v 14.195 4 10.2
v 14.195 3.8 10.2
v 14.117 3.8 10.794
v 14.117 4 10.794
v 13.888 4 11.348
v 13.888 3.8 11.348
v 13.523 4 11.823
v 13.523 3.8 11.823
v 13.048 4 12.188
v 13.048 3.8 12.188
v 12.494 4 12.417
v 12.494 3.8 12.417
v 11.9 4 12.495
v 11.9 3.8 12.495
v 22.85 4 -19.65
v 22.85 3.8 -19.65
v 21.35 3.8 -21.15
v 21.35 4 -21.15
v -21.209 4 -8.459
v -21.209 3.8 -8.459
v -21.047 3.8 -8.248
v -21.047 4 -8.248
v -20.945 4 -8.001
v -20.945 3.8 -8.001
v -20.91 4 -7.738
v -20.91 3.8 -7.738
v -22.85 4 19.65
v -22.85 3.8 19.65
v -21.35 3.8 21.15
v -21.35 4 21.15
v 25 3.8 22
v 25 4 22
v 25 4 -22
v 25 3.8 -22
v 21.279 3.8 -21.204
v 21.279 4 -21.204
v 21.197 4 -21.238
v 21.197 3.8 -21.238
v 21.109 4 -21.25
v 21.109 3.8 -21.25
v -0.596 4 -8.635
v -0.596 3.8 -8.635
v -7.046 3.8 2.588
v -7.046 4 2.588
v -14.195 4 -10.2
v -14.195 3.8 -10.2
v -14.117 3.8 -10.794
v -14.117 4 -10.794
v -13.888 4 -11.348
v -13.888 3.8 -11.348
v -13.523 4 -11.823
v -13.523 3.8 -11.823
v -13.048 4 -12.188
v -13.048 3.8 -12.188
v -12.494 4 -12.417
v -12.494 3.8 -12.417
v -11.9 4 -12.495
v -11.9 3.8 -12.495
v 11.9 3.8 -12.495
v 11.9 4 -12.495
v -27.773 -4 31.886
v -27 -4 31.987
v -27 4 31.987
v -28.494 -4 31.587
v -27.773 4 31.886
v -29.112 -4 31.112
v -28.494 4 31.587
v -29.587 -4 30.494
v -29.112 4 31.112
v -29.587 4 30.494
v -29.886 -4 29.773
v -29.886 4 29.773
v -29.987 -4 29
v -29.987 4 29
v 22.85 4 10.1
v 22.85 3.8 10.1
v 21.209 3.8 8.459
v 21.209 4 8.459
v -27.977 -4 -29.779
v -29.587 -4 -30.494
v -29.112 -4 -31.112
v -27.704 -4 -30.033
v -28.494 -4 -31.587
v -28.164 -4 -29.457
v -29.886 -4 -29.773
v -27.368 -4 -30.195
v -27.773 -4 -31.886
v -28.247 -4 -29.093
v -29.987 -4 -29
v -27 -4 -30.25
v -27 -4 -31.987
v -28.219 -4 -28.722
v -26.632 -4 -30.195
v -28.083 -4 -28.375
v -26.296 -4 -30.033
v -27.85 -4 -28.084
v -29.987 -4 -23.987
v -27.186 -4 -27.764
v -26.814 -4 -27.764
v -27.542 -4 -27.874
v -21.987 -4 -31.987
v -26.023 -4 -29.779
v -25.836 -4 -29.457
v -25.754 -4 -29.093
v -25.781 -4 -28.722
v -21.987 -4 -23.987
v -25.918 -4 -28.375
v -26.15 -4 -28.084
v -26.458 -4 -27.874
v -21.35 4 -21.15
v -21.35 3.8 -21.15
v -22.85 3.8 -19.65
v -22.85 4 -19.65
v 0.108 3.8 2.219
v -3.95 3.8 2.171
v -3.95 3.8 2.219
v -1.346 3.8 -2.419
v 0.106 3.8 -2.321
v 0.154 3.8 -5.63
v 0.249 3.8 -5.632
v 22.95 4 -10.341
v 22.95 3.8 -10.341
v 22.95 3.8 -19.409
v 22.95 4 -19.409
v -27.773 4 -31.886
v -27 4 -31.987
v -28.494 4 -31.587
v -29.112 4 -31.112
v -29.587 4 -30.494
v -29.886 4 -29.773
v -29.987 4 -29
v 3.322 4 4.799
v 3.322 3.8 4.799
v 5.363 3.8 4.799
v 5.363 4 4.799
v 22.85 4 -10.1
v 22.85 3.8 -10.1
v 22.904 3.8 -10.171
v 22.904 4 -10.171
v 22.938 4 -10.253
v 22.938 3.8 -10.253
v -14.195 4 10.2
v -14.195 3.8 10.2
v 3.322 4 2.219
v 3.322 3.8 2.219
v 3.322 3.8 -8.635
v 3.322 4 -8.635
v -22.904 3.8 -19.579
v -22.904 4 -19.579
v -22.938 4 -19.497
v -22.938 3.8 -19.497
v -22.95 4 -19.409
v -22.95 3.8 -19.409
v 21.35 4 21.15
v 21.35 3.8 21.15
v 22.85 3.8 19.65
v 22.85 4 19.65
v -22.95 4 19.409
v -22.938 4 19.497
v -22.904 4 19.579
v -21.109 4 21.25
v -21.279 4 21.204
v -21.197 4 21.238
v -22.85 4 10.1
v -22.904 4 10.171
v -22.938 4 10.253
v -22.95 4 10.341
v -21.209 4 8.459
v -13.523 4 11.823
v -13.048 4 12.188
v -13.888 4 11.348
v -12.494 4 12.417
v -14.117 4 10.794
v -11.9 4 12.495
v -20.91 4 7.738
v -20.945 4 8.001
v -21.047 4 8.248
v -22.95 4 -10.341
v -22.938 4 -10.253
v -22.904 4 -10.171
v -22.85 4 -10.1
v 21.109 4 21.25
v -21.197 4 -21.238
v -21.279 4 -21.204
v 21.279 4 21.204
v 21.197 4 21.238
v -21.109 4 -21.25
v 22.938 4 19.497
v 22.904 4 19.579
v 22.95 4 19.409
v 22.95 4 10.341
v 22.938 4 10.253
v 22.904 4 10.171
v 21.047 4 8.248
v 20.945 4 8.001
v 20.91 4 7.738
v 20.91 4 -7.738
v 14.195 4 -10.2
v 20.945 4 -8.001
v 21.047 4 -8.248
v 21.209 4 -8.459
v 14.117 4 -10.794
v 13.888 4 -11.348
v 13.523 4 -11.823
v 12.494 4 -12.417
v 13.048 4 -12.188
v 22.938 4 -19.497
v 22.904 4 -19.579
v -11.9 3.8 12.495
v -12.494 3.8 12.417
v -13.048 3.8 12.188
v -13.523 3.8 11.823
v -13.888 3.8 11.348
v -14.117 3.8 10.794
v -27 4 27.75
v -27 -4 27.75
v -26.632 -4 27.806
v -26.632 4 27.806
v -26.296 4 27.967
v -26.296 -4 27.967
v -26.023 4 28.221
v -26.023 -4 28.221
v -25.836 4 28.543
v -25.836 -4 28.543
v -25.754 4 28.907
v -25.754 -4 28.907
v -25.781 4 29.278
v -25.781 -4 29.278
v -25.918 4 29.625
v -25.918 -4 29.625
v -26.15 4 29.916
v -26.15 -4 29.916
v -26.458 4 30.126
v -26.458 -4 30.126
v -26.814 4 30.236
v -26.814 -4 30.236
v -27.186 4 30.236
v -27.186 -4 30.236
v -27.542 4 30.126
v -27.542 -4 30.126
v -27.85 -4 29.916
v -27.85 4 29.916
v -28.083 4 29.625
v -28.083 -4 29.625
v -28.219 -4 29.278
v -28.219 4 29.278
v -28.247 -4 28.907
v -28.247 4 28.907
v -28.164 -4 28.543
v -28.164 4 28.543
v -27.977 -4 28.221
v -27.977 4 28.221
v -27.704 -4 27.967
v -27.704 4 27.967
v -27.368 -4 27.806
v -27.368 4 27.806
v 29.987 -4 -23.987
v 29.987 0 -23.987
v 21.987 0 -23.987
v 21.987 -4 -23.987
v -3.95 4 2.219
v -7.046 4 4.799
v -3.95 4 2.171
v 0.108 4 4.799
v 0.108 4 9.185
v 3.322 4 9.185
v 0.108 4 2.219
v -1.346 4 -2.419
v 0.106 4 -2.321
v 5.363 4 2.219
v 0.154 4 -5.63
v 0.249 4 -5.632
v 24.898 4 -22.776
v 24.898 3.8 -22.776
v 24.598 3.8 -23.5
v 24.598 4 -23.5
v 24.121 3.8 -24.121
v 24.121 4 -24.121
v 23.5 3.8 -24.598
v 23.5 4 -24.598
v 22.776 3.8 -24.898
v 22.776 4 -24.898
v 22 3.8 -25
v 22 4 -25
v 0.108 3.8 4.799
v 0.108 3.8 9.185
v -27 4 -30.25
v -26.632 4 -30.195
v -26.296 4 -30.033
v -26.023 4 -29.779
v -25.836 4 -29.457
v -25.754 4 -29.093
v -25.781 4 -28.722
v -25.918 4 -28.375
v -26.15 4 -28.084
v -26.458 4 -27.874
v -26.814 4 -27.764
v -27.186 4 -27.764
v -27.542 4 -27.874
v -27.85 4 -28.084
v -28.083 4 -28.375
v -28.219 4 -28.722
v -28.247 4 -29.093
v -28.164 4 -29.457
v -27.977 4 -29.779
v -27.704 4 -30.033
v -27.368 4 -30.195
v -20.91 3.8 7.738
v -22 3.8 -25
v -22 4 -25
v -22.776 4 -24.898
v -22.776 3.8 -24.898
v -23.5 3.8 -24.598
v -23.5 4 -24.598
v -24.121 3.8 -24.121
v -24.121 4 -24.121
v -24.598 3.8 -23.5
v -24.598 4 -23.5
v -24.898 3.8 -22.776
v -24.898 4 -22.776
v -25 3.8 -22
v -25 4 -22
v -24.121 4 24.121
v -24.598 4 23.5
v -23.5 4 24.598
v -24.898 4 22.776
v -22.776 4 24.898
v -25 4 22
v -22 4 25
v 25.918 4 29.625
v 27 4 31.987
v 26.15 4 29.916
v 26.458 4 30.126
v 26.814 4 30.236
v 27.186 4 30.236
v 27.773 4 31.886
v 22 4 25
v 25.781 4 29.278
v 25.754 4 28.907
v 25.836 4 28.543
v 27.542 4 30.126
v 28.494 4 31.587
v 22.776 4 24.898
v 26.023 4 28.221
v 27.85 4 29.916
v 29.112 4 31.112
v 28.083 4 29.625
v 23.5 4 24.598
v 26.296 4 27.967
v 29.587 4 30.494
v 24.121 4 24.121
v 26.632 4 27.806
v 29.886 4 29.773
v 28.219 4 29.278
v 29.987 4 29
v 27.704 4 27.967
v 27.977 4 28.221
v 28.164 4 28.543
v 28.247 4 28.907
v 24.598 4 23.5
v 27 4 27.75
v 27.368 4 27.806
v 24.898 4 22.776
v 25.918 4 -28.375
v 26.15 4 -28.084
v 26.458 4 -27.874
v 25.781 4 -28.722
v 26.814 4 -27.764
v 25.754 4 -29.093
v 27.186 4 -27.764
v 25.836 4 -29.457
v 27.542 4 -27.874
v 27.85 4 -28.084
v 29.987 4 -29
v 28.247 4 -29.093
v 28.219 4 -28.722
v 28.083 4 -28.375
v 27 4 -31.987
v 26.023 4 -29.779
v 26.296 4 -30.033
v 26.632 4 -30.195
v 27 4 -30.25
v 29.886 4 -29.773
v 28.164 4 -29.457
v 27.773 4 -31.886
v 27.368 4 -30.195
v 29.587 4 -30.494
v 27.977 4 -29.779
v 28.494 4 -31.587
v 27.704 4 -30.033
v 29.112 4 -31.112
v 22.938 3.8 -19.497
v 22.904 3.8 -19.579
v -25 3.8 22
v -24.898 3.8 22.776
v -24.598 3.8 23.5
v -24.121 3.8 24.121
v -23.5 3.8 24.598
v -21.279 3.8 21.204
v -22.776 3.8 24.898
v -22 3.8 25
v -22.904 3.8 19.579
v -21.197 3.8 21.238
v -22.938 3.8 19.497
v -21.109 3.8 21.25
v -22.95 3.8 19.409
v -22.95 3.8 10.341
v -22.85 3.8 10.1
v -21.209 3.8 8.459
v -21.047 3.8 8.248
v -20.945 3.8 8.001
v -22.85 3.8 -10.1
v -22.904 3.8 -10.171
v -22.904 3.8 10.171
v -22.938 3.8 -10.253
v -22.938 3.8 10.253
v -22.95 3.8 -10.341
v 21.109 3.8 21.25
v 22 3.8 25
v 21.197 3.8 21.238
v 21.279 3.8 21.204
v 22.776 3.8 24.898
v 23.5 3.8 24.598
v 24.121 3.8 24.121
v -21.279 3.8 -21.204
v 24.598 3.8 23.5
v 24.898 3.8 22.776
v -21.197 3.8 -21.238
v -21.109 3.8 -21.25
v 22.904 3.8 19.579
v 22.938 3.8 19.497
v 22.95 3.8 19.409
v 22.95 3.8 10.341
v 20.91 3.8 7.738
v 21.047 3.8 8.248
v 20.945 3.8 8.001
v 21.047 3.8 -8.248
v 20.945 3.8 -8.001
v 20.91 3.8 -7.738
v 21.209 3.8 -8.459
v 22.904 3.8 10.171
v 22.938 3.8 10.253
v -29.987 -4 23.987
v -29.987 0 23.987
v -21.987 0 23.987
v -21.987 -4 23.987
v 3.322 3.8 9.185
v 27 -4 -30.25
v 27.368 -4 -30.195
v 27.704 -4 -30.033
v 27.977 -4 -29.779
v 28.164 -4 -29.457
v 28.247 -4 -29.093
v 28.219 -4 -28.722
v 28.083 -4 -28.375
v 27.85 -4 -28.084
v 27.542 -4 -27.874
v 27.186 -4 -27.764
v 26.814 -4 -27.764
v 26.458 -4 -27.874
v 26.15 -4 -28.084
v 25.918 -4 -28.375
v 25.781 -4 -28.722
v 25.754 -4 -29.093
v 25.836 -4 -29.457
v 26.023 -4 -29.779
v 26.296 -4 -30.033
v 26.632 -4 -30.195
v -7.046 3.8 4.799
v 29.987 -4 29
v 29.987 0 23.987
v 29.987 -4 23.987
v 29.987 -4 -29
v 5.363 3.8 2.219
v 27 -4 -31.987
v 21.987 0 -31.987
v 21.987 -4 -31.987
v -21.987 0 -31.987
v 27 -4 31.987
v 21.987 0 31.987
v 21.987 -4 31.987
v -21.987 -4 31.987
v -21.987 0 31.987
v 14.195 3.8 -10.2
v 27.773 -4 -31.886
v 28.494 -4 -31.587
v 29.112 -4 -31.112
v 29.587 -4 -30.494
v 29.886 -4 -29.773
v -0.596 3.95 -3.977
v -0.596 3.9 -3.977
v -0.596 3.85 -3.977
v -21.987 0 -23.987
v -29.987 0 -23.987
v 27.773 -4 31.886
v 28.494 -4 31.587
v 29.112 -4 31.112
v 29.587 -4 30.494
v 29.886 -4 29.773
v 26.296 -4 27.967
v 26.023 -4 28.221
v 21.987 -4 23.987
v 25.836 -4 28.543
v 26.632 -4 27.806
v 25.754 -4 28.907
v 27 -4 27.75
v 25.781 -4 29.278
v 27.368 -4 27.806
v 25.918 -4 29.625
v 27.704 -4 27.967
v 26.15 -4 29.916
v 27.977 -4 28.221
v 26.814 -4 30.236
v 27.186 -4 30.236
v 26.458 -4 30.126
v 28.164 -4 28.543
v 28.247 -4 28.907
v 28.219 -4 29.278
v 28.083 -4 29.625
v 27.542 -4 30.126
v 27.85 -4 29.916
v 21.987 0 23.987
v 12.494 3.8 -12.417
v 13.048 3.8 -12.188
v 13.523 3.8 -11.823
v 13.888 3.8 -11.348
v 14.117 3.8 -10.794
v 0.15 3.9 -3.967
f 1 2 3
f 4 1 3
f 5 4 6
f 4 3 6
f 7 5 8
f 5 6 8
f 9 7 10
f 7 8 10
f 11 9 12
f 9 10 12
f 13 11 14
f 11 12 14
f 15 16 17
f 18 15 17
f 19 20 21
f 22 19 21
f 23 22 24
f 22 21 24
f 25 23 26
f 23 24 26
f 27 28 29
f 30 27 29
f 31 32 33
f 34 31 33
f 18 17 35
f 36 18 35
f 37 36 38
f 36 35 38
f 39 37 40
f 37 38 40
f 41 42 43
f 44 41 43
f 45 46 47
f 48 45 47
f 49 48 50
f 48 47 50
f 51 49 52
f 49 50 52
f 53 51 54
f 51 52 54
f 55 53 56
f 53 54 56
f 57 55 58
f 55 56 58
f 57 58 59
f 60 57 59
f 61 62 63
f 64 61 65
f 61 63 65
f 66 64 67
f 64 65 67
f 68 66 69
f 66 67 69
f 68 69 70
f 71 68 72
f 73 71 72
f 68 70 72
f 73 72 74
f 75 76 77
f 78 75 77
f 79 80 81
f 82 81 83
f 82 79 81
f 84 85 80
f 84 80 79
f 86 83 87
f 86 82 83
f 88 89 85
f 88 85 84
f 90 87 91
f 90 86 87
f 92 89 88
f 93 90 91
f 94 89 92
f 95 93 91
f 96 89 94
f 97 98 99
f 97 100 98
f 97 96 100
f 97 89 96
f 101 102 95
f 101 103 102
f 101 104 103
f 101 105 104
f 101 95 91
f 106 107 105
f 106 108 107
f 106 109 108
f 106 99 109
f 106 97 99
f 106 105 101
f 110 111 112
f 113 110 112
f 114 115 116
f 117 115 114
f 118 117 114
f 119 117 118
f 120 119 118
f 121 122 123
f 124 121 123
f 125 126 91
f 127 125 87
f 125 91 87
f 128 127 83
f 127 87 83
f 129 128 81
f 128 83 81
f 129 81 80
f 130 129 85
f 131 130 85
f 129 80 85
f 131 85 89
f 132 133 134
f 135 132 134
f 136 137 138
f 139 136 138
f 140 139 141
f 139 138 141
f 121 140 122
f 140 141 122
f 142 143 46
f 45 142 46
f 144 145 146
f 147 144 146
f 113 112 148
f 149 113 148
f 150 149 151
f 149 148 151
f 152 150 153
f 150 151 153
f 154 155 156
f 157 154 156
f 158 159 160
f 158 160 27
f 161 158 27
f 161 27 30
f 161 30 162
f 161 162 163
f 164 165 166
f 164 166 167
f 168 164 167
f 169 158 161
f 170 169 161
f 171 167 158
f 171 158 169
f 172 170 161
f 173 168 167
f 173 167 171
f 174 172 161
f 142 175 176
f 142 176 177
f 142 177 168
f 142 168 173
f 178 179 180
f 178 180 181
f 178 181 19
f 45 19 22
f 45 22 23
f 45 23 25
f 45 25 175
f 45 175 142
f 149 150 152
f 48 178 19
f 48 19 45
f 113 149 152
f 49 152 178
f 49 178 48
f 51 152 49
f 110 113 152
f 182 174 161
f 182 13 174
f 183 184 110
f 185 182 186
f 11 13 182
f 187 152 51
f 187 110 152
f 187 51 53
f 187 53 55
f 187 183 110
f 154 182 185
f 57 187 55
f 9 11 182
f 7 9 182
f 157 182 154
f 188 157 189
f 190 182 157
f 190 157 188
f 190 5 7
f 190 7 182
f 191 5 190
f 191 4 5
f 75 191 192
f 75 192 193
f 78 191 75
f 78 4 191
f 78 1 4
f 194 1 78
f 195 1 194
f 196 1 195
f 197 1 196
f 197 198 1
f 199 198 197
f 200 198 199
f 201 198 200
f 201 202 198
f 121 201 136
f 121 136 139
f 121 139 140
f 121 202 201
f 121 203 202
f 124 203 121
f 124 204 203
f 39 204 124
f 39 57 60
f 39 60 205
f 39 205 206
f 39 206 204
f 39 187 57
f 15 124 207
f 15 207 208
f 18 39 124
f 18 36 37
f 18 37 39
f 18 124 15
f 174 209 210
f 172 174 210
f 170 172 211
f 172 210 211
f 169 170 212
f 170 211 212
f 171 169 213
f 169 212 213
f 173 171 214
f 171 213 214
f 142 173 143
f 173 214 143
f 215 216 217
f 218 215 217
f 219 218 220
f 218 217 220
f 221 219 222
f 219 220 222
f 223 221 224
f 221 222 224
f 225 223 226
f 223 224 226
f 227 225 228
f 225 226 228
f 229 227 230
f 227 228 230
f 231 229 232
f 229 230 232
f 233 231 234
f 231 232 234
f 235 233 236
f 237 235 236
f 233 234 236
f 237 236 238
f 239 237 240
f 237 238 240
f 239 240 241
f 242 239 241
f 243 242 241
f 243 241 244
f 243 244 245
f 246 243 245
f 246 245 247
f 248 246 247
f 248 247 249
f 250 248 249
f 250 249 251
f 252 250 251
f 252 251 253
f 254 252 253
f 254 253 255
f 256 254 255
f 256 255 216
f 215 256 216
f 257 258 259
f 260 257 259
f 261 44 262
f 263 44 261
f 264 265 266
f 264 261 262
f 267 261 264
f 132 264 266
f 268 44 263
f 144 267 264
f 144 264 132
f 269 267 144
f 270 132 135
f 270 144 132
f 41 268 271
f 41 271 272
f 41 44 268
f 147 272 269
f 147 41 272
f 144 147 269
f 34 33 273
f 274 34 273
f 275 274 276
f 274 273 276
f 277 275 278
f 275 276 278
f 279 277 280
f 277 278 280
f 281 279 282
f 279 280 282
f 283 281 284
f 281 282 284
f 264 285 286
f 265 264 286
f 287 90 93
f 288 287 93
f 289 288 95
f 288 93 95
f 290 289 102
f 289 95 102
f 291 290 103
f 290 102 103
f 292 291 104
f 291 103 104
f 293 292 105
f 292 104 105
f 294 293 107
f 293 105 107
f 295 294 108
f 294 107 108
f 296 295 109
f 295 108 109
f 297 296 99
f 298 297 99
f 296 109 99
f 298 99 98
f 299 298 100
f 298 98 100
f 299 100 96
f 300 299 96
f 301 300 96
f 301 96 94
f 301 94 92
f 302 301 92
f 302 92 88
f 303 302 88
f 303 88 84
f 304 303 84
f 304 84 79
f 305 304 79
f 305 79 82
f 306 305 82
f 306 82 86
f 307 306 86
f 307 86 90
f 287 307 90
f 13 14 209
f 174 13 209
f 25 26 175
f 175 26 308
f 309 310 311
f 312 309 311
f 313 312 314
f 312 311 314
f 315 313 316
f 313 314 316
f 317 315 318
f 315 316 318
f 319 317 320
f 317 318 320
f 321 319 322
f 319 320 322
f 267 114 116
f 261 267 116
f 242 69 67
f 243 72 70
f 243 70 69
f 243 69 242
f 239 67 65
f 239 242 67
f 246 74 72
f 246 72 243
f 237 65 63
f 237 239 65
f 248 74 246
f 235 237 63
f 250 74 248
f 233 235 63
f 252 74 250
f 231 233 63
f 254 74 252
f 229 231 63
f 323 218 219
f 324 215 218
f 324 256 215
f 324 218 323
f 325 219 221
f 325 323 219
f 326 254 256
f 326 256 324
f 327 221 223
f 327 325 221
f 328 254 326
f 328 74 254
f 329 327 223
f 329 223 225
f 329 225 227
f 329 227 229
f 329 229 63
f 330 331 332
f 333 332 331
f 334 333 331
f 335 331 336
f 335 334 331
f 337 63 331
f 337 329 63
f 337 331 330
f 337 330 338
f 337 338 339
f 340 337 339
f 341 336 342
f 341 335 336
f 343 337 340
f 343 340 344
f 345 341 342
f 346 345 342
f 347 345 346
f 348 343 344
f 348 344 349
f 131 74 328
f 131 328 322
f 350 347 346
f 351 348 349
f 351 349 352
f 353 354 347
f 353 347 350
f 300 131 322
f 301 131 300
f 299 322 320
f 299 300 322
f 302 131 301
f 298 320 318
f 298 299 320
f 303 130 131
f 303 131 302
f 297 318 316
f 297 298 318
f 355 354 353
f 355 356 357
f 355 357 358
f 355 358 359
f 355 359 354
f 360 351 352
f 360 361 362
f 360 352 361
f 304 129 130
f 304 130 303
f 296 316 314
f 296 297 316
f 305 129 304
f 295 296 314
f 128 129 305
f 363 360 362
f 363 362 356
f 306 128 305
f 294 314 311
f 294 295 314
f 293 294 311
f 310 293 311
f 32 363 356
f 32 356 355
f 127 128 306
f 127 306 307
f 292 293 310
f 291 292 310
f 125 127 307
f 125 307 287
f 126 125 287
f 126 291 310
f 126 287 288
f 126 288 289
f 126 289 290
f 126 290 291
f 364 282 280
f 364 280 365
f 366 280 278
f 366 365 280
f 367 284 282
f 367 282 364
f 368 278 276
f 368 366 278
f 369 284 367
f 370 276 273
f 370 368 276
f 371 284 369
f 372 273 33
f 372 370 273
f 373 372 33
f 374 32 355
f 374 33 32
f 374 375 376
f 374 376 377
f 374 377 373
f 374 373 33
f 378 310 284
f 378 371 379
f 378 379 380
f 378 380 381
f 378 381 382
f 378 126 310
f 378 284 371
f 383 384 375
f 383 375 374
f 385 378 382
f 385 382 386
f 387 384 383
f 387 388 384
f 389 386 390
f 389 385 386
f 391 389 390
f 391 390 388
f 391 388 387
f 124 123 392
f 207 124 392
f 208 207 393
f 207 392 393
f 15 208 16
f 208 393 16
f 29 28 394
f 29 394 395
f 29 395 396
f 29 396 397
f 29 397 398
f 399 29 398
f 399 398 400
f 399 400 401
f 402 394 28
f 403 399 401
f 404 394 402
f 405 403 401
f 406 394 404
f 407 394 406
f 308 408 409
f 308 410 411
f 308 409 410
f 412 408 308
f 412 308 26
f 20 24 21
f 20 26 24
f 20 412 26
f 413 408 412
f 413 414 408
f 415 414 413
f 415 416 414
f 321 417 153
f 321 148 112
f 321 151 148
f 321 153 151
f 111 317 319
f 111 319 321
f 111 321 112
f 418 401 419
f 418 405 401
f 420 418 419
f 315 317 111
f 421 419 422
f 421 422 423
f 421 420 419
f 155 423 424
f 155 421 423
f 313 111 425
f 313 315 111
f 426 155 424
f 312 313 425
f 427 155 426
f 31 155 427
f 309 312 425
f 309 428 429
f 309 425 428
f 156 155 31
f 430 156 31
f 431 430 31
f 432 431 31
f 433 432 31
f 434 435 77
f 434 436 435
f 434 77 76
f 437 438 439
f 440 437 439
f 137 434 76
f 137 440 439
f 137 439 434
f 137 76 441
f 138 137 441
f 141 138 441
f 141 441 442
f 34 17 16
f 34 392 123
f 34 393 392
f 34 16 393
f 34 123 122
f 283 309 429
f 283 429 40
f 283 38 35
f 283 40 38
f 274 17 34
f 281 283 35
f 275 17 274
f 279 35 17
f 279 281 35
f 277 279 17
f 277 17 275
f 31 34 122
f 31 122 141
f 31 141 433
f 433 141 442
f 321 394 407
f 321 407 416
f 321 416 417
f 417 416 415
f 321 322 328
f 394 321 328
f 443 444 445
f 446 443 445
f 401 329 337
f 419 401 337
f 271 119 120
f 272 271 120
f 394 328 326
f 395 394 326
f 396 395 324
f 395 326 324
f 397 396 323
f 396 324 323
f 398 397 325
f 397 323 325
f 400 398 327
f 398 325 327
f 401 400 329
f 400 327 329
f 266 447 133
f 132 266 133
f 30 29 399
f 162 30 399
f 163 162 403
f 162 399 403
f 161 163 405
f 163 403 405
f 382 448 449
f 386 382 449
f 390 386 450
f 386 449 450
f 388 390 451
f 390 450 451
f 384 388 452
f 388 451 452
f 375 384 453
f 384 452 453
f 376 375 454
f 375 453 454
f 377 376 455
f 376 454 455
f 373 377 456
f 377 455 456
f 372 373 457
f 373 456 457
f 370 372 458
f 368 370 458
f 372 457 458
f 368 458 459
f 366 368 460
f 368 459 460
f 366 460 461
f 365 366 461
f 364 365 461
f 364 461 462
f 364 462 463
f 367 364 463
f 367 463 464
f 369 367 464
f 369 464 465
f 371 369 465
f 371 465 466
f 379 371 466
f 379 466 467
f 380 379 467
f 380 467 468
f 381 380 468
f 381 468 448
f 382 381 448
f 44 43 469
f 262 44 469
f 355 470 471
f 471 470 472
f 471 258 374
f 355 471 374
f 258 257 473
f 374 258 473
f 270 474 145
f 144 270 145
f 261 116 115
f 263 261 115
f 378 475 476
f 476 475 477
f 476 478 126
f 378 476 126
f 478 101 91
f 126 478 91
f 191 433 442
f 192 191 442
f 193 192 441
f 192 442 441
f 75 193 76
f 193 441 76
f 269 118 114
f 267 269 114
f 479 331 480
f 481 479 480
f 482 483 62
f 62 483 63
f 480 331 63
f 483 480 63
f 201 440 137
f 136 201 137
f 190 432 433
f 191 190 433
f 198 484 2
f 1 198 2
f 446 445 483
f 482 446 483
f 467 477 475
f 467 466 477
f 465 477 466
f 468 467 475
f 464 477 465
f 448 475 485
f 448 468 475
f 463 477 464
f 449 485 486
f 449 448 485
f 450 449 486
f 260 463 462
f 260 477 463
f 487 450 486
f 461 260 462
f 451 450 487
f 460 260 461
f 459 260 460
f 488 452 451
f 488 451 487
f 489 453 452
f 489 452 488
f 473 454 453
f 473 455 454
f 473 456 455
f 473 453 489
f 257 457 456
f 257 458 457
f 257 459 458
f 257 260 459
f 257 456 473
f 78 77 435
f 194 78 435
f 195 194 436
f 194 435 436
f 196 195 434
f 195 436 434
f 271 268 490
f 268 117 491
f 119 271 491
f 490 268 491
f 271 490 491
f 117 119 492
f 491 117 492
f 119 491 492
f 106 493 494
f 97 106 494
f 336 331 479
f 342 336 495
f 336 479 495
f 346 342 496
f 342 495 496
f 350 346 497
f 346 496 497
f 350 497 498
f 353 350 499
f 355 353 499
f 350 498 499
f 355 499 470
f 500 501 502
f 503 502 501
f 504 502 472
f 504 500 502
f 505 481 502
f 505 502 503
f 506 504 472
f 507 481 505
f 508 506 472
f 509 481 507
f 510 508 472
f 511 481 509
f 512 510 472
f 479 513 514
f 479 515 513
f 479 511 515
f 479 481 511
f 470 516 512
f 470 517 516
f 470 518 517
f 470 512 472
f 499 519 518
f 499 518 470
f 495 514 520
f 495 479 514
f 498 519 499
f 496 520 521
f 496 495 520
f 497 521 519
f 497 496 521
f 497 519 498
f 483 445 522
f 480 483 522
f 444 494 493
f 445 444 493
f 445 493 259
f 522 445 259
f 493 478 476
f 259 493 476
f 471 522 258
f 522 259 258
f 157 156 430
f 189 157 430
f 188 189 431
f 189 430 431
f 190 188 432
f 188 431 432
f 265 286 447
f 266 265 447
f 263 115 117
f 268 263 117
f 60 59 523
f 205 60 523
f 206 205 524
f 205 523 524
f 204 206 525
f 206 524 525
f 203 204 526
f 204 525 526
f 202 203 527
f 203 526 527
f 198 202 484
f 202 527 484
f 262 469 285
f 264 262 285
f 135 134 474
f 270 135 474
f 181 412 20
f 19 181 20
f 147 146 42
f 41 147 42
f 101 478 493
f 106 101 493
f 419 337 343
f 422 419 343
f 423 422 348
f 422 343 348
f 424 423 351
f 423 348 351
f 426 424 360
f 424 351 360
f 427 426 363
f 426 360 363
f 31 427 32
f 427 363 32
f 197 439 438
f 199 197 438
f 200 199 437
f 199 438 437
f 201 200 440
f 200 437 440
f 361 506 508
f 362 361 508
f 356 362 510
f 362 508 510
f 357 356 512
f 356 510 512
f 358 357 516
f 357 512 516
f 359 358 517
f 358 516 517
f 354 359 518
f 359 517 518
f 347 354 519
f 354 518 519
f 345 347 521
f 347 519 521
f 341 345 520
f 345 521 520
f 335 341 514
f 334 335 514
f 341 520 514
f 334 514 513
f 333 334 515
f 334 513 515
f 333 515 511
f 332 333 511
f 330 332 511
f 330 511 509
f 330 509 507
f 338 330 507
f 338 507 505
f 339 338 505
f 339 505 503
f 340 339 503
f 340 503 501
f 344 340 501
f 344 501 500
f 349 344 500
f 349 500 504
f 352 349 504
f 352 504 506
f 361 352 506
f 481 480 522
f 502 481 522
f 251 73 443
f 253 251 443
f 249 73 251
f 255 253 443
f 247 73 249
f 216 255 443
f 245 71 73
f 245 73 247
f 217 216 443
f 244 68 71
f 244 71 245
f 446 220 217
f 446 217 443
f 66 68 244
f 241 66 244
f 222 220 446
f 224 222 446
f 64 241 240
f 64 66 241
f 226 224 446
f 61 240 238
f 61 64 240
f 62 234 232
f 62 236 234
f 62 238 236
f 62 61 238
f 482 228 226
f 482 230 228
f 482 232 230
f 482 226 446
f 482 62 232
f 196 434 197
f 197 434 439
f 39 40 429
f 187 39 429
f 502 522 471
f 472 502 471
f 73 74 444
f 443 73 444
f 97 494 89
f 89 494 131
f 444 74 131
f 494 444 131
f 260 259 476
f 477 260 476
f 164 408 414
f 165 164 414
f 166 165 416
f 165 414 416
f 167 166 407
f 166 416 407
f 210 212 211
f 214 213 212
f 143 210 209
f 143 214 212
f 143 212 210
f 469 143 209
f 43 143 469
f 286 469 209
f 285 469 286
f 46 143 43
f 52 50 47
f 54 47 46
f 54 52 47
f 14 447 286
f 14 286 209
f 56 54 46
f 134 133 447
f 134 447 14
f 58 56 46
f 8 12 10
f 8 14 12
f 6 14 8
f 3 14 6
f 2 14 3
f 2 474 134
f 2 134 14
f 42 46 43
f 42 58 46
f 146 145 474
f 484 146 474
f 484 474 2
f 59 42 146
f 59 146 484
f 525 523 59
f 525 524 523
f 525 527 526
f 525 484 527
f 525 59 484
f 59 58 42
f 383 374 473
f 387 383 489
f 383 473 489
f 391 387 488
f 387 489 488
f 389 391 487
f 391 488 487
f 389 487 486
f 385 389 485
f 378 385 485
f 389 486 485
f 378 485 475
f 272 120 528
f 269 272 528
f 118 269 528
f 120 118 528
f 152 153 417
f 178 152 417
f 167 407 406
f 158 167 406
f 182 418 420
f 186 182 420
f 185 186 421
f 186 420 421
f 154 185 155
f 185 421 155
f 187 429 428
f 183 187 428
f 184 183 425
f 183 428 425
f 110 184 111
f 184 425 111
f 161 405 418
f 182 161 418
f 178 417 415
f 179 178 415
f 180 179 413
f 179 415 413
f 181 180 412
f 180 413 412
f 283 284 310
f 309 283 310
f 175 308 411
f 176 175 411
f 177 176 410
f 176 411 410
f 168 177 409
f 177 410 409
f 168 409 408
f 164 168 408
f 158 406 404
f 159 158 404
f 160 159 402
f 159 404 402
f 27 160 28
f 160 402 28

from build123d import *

# Parameters (mm, degrees)
EXTRUDE_1_DEPTH     = 4
EXTRUDE_2_DEPTH     = 4
SKETCH_3_R          = 1.25
CUT_EXTRUDE_1_DEPTH = 15
CUT_EXTRUDE_2_DEPTH = 0.2
EXTRUDE_5_DEPTH     = 0.2
EXTRUDE_6_DEPTH     = 0.2
SKETCH_13_R         = 2.280555424
SKETCH_13_R_2       = 2.93479419
SKETCH_13_R_3       = 2.630805897
SKETCH_13_R_4       = 2.84821008
EXTRUDE_7_DEPTH     = 0.2


with BuildPart() as part:
    # 草图1 → 凸台-拉伸1 (new body)
    with BuildSketch(Plane(origin=(0, 0, 0), x_dir=(1, 0, 0), z_dir=(0, 1, 0))):
        with BuildLine():
            Line((-27.00005461, -31.987363475), (27.00005461, -31.987363475))
            ThreePointArc((27.00005461, -31.987363475), (29.112398272, -31.112402082), (29.987359665, -29.00005842))
            Line((29.987359665, -29.00005842), (29.987359665, 29.00005842))
            ThreePointArc((29.987359665, 29.00005842), (29.112398272, 31.112402082), (27.00005461, 31.987363475))
            Line((27.00005461, 31.987363475), (-27.00005461, 31.987363475))
            ThreePointArc((-27.00005461, 31.987363475), (-29.112398272, 31.112402082), (-29.987359665, 29.00005842))
            Line((-29.987359665, 29.00005842), (-29.987359665, -29.00005842))
            ThreePointArc((-29.987359665, -29.00005842), (-29.112398272, -31.112402082), (-27.00005461, -31.987363475))
        make_face()
    extrude(amount=EXTRUDE_1_DEPTH)

    # 草图2 → 凸台-拉伸2 (add)
    with BuildSketch(Plane.XZ):
        with BuildLine():
            Line((-21.987359665, 23.987363475), (-21.987359665, 31.987363475))
            Line((-21.987359665, 31.987363475), (-27.00005461, 31.987363475))
            ThreePointArc((-27.00005461, 31.987363475), (-29.112398272, 31.112402082), (-29.987359665, 29.00005842))
            Line((-29.987359665, 29.00005842), (-29.987359665, 23.987363475))
            Line((-29.987359665, 23.987363475), (-21.987359665, 23.987363475))
        make_face()
        with BuildLine():
            Line((21.987359665, -23.987363475), (21.987359665, -31.987363475))
            Line((21.987359665, -31.987363475), (27.00005461, -31.987363475))
            ThreePointArc((27.00005461, -31.987363475), (29.112398272, -31.112402082), (29.987359665, -29.00005842))
            Line((29.987359665, -29.00005842), (29.987359665, -23.987363475))
            Line((29.987359665, -23.987363475), (21.987359665, -23.987363475))
        make_face()
        with BuildLine():
            Line((21.987359665, 23.987363475), (29.987359665, 23.987363475))
            Line((29.987359665, 23.987363475), (29.987359665, 29.00005842))
            ThreePointArc((29.987359665, 29.00005842), (29.112398272, 31.112402082), (27.00005461, 31.987363475))
            Line((27.00005461, 31.987363475), (21.987359665, 31.987363475))
            Line((21.987359665, 31.987363475), (21.987359665, 23.987363475))
        make_face()
        with BuildLine():
            Line((-29.987359665, -23.987363475), (-29.987359665, -29.00005842))
            ThreePointArc((-29.987359665, -29.00005842), (-29.112398272, -31.112402082), (-27.00005461, -31.987363475))
            Line((-27.00005461, -31.987363475), (-21.987359665, -31.987363475))
            Line((-21.987359665, -31.987363475), (-21.987359665, -23.987363475))
            Line((-21.987359665, -23.987363475), (-29.987359665, -23.987363475))
        make_face()
    extrude(amount=EXTRUDE_2_DEPTH)

    # 草图3 → 切除-拉伸1 (cut)
    with BuildSketch(Plane.XZ.offset(4)):
        with Locations(Location((-27.00005461, 29.00005842, 0), (0, 0, 270))):
            Circle(SKETCH_3_R)
        with Locations(Location((27.00005461, 29.00005842, 0), (0, 0, 270))):
            Circle(SKETCH_3_R)
        with Locations(Location((27.00005461, -29.00005842, 0), (0, 0, 270))):
            Circle(SKETCH_3_R)
        with Locations(Location((-27.00005461, -29.00005842, 0), (0, 0, 270))):
            Circle(SKETCH_3_R)
    extrude(amount=-CUT_EXTRUDE_1_DEPTH, mode=Mode.SUBTRACT)

    # 草图4 → 切除-拉伸2 (cut)
    with BuildSketch(Plane(origin=(0, 4, 0), x_dir=(1, 0, 0), z_dir=(0, 1, 0))):
        with BuildLine():
            Line((-22, -25), (22, -25))
            ThreePointArc((22, -25), (24.121320344, -24.121320344), (25, -22))
            Line((25, -22), (25, 22))
            ThreePointArc((25, 22), (24.121320344, 24.121320344), (22, 25))
            Line((22, 25), (-22, 25))
            ThreePointArc((-22, 25), (-24.121320344, 24.121320344), (-25, 22))
            Line((-25, 22), (-25, -22))
            ThreePointArc((-25, -22), (-24.121320344, -24.121320344), (-22, -25))
        make_face()
    extrude(amount=-CUT_EXTRUDE_2_DEPTH, mode=Mode.SUBTRACT)

    # 草图9 → 凸台-拉伸5 (add)
    with BuildSketch(Plane(origin=(0, 3.8, 0), x_dir=(1, 0, 0), z_dir=(0, 1, 0))):
        with BuildLine():
            ThreePointArc((-21.208751083, 8.458751083), (-20.987642877, 8.127839267), (-20.91, 7.737502166))
            Line((-20.91, 7.737502166), (-20.91, -7.737502166))
            ThreePointArc((-20.91, -7.737502166), (-20.987642877, -8.127839267), (-21.208751083, -8.458751083))
            Line((-21.208751083, -8.458751083), (-22.850416306, -10.100416306))
            ThreePointArc((-22.850416306, -10.100416306), (-22.924119041, -10.210720244), (-22.95, -10.340832611))
            Line((-22.95, -10.340832611), (-22.95, -19.409167389))
            ThreePointArc((-22.95, -19.409167389), (-22.924119041, -19.539279756), (-22.850416306, -19.649583694))
            Line((-22.850416306, -19.649583694), (-21.349583694, -21.150416306))
            ThreePointArc((-21.349583694, -21.150416306), (-21.239279756, -21.224119041), (-21.109167389, -21.25))
            Line((-21.109167389, -21.25), (21.109167389, -21.25))
            ThreePointArc((21.109167389, -21.25), (21.239279756, -21.224119041), (21.349583694, -21.150416306))
            Line((21.349583694, -21.150416306), (22.850416306, -19.649583694))
            ThreePointArc((22.850416306, -19.649583694), (22.924119041, -19.539279756), (22.95, -19.409167389))
            Line((22.95, -19.409167389), (22.95, -10.340832611))
            ThreePointArc((22.95, -10.340832611), (22.924119041, -10.210720244), (22.850416306, -10.100416306))
            Line((22.850416306, -10.100416306), (21.208751083, -8.458751083))
            ThreePointArc((21.208751083, -8.458751083), (20.987642877, -8.127839267), (20.91, -7.737502166))
            Line((20.91, -7.737502166), (20.91, 7.737502166))
            ThreePointArc((20.91, 7.737502166), (20.987642877, 8.127839267), (21.208751083, 8.458751083))
            Line((21.208751083, 8.458751083), (22.850416306, 10.100416306))
            ThreePointArc((22.850416306, 10.100416306), (22.924119041, 10.210720244), (22.95, 10.340832611))
            Line((22.95, 10.340832611), (22.95, 19.409167389))
            ThreePointArc((22.95, 19.409167389), (22.924119041, 19.539279756), (22.850416306, 19.649583694))
            Line((22.850416306, 19.649583694), (21.349583694, 21.150416306))
            ThreePointArc((21.349583694, 21.150416306), (21.239279756, 21.224119041), (21.109167389, 21.25))
            Line((21.109167389, 21.25), (-21.109167389, 21.25))
            ThreePointArc((-21.109167389, 21.25), (-21.239279756, 21.224119041), (-21.349583694, 21.150416306))
            Line((-21.349583694, 21.150416306), (-22.850416306, 19.649583694))
            ThreePointArc((-22.850416306, 19.649583694), (-22.924119041, 19.539279756), (-22.95, 19.409167389))
            Line((-22.95, 19.409167389), (-22.95, 10.340832611))
            ThreePointArc((-22.95, 10.340832611), (-22.924119041, 10.210720244), (-22.850416306, 10.100416306))
            Line((-22.850416306, 10.100416306), (-21.208751083, 8.458751083))
        make_face()
        with BuildLine():
            ThreePointArc((-14.688, -17.765), (-16.15, -19.227), (-17.612, -17.765))
            ThreePointArc((-17.612, -17.765), (-16.15, -16.303), (-14.688, -17.765))
        make_face(mode=Mode.SUBTRACT)
        with BuildLine():
            ThreePointArc((14.688, -17.765), (16.15, -16.303), (17.612, -17.765))
            ThreePointArc((17.612, -17.765), (16.15, -19.227), (14.688, -17.765))
        make_face(mode=Mode.SUBTRACT)
        with BuildLine():
            Line((11.9, -12.495), (-11.9, -12.495))
            ThreePointArc((-11.9, -12.495), (-13.522810063, -11.822810063), (-14.195, -10.2))
            Line((-14.195, -10.2), (-14.195, 10.2))
            ThreePointArc((-14.195, 10.2), (-13.522810063, 11.822810063), (-11.9, 12.495))
            Line((-11.9, 12.495), (11.9, 12.495))
            ThreePointArc((11.9, 12.495), (13.522810063, 11.822810063), (14.195, 10.2))
            Line((14.195, 10.2), (14.195, -10.2))
            ThreePointArc((14.195, -10.2), (13.522810063, -11.822810063), (11.9, -12.495))
        make_face(mode=Mode.SUBTRACT)
        with BuildLine():
            ThreePointArc((-14.688, 17.765), (-16.15, 16.303), (-17.612, 17.765))
            ThreePointArc((-17.612, 17.765), (-16.15, 19.227), (-14.688, 17.765))
        make_face(mode=Mode.SUBTRACT)
        with BuildLine():
            ThreePointArc((17.612, 17.765), (16.15, 16.303), (14.688, 17.765))
            ThreePointArc((14.688, 17.765), (16.15, 19.227), (17.612, 17.765))
        make_face(mode=Mode.SUBTRACT)
    extrude(amount=EXTRUDE_5_DEPTH)

    # 草图12 → 凸台-拉伸6 (add)
    with BuildSketch(Plane(origin=(0, 3.8, 0), x_dir=(1, 0, 0), z_dir=(0, 1, 0))):
        Polygon((5.362596469, -4.798672993), (5.362596469, -2.219483683), (3.321803619, -2.219483683), (3.321803619, 8.634725488), (-0.595580356, 8.634725488), (-7.046362352, -2.587805787), (-7.046362352, -4.798672993), (0.108141316, -4.798672993), (0.108141316, -9.18520475), (3.321803619, -9.18520475), (3.321803619, -4.798672993), align=None)
        with BuildLine():
            add(Edge.make_bspline(
                [(-1.346216807, 2.419233234), (-1.215389858, 2.676405088), (-0.953971645, 3.190285503), (-0.591881771, 3.983382076), (-0.22871235, 4.799127855), (0.024319607, 5.348664428), (0.153889522, 5.630065273)],
                knots=[0, 0, 0, 0, 0.976764423, 1.951769216, 2.951163759, 4, 4, 4, 4], degree=3))
            Line((0.153889522, 5.630065273), (0.248885651, 5.632179686))
            add(Edge.make_bspline(
                [(0.248885651, 5.632179686), (0.211585261, 5.077369517), (0.137462974, 3.974866313), (0.116695103, 2.87007222), (0.106378201, 2.321241135)],
                knots=[0, 0, 0, 0, 1.006455431, 2, 2, 2, 2], degree=3))
            Line((0.106378201, 2.321241135), (0.108141316, -2.219483683))
            Line((0.108141316, -2.219483683), (-3.949986994, -2.219483683))
            Line((-3.949986994, -2.219483683), (-3.949986994, -2.171163716))
            Line((-3.949986994, -2.171163716), (-1.346216807, 2.419233234))
        make_face(mode=Mode.SUBTRACT)
    extrude(amount=EXTRUDE_6_DEPTH)

    # 草图13 → 凸台-拉伸7 (add)
    with BuildSketch(Plane(origin=(0, 3.8, 0), x_dir=(1, 0, 0), z_dir=(0, 1, 0))):
        with Locations((-16.15, 17.765)):
            Circle(SKETCH_13_R)
        with Locations((16.15, 17.765)):
            Circle(SKETCH_13_R_2)
        with Locations((16.15, -17.765)):
            Circle(SKETCH_13_R_3)
        with Locations((-16.15, -17.765)):
            Circle(SKETCH_13_R_4)
    extrude(amount=EXTRUDE_7_DEPTH)


solid = part.part
